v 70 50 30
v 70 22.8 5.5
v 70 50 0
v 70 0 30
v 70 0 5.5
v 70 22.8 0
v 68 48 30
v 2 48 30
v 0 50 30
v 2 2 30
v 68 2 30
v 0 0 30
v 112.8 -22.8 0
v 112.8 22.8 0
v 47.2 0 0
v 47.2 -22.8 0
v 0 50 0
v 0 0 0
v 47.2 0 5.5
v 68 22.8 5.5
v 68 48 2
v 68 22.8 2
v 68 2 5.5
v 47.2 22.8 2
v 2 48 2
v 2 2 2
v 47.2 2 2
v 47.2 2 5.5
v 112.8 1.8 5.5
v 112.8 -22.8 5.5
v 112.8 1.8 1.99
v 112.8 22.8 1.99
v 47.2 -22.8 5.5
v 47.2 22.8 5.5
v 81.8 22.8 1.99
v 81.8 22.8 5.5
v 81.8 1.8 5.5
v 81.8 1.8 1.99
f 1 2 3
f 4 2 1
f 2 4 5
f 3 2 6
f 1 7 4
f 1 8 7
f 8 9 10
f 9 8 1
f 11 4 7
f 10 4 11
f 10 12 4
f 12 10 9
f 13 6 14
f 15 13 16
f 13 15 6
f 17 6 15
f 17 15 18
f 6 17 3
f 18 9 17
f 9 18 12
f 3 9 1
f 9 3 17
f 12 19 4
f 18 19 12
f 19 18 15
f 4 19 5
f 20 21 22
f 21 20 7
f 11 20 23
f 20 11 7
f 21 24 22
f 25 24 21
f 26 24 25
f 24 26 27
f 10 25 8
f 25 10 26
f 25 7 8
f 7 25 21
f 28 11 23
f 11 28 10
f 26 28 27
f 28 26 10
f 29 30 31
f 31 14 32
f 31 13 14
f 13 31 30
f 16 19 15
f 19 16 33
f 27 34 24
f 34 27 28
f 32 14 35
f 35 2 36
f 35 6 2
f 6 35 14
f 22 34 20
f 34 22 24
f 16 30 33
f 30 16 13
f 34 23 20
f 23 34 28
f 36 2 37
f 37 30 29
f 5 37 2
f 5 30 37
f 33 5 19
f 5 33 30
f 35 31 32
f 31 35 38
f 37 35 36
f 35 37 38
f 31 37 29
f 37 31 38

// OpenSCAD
// Two-part enclosure for small electronics board
// Print orientation: box standing on bed (z = 0), lid on top, printed upside down

// ---------------- Parameters ----------------
box_x      = 70;    // box outer length (X)
box_y      = 50;    // box outer width (Y)
box_z      = 30;    // box outer height (Z)
box_wall   = 2;     // box wall thickness
box_floor  = 2;     // box floor thickness

gap        = 10;    // gap between box and lid

lip_wall   = 1.5;   // lid lip wall thickness
lip_h      = 4;     // lid lip height
lip_x      = 65.6;  // lid lip outer length (X)
lip_y      = 45.6;  // lid lip outer width (Y)

eps        = 0.5;   // cutter overshoot past faces

$fn = 64;

// ---------------- Derived ----------------
box_inner_x = box_x - 2 * box_wall;
box_inner_y = box_y - 2 * box_wall;
box_inner_z = box_z - box_floor;   // open-top cavity height

// ---------------- Model ----------------
union() {
    // Part 1: Box, open top
    difference() {
        cube([box_x, box_y, box_z]);
        translate([box_wall, box_wall, box_floor])
            cube([box_inner_x, box_inner_y, box_inner_z + 0.01]); // avoid coplanar top face
    }

    // Part 2: Lid, printed upside down (base plate with lip on top)
    translate([box_x + gap, 0, 0]) {
        difference() {
            union() {
                // Base plate
                translate([-lip_x / 2, -lip_y / 2, 0])
                    cube([lip_x, lip_y, lip_wall]);
                // Lip
                translate([-lip_x / 2, -lip_y / 2, lip_wall])
                    cube([lip_x, lip_y, lip_h]);
            }
            // Cut out the box cavity so the lid slides into it (0.2 mm clearance)
            translate([box_wall - 0.2, box_wall - 0.2, box_floor - 0.01])
                cube([box_inner_x + 0.4, box_inner_y + 0.4, box_inner_z + 0.02]);
        }
    }
}
